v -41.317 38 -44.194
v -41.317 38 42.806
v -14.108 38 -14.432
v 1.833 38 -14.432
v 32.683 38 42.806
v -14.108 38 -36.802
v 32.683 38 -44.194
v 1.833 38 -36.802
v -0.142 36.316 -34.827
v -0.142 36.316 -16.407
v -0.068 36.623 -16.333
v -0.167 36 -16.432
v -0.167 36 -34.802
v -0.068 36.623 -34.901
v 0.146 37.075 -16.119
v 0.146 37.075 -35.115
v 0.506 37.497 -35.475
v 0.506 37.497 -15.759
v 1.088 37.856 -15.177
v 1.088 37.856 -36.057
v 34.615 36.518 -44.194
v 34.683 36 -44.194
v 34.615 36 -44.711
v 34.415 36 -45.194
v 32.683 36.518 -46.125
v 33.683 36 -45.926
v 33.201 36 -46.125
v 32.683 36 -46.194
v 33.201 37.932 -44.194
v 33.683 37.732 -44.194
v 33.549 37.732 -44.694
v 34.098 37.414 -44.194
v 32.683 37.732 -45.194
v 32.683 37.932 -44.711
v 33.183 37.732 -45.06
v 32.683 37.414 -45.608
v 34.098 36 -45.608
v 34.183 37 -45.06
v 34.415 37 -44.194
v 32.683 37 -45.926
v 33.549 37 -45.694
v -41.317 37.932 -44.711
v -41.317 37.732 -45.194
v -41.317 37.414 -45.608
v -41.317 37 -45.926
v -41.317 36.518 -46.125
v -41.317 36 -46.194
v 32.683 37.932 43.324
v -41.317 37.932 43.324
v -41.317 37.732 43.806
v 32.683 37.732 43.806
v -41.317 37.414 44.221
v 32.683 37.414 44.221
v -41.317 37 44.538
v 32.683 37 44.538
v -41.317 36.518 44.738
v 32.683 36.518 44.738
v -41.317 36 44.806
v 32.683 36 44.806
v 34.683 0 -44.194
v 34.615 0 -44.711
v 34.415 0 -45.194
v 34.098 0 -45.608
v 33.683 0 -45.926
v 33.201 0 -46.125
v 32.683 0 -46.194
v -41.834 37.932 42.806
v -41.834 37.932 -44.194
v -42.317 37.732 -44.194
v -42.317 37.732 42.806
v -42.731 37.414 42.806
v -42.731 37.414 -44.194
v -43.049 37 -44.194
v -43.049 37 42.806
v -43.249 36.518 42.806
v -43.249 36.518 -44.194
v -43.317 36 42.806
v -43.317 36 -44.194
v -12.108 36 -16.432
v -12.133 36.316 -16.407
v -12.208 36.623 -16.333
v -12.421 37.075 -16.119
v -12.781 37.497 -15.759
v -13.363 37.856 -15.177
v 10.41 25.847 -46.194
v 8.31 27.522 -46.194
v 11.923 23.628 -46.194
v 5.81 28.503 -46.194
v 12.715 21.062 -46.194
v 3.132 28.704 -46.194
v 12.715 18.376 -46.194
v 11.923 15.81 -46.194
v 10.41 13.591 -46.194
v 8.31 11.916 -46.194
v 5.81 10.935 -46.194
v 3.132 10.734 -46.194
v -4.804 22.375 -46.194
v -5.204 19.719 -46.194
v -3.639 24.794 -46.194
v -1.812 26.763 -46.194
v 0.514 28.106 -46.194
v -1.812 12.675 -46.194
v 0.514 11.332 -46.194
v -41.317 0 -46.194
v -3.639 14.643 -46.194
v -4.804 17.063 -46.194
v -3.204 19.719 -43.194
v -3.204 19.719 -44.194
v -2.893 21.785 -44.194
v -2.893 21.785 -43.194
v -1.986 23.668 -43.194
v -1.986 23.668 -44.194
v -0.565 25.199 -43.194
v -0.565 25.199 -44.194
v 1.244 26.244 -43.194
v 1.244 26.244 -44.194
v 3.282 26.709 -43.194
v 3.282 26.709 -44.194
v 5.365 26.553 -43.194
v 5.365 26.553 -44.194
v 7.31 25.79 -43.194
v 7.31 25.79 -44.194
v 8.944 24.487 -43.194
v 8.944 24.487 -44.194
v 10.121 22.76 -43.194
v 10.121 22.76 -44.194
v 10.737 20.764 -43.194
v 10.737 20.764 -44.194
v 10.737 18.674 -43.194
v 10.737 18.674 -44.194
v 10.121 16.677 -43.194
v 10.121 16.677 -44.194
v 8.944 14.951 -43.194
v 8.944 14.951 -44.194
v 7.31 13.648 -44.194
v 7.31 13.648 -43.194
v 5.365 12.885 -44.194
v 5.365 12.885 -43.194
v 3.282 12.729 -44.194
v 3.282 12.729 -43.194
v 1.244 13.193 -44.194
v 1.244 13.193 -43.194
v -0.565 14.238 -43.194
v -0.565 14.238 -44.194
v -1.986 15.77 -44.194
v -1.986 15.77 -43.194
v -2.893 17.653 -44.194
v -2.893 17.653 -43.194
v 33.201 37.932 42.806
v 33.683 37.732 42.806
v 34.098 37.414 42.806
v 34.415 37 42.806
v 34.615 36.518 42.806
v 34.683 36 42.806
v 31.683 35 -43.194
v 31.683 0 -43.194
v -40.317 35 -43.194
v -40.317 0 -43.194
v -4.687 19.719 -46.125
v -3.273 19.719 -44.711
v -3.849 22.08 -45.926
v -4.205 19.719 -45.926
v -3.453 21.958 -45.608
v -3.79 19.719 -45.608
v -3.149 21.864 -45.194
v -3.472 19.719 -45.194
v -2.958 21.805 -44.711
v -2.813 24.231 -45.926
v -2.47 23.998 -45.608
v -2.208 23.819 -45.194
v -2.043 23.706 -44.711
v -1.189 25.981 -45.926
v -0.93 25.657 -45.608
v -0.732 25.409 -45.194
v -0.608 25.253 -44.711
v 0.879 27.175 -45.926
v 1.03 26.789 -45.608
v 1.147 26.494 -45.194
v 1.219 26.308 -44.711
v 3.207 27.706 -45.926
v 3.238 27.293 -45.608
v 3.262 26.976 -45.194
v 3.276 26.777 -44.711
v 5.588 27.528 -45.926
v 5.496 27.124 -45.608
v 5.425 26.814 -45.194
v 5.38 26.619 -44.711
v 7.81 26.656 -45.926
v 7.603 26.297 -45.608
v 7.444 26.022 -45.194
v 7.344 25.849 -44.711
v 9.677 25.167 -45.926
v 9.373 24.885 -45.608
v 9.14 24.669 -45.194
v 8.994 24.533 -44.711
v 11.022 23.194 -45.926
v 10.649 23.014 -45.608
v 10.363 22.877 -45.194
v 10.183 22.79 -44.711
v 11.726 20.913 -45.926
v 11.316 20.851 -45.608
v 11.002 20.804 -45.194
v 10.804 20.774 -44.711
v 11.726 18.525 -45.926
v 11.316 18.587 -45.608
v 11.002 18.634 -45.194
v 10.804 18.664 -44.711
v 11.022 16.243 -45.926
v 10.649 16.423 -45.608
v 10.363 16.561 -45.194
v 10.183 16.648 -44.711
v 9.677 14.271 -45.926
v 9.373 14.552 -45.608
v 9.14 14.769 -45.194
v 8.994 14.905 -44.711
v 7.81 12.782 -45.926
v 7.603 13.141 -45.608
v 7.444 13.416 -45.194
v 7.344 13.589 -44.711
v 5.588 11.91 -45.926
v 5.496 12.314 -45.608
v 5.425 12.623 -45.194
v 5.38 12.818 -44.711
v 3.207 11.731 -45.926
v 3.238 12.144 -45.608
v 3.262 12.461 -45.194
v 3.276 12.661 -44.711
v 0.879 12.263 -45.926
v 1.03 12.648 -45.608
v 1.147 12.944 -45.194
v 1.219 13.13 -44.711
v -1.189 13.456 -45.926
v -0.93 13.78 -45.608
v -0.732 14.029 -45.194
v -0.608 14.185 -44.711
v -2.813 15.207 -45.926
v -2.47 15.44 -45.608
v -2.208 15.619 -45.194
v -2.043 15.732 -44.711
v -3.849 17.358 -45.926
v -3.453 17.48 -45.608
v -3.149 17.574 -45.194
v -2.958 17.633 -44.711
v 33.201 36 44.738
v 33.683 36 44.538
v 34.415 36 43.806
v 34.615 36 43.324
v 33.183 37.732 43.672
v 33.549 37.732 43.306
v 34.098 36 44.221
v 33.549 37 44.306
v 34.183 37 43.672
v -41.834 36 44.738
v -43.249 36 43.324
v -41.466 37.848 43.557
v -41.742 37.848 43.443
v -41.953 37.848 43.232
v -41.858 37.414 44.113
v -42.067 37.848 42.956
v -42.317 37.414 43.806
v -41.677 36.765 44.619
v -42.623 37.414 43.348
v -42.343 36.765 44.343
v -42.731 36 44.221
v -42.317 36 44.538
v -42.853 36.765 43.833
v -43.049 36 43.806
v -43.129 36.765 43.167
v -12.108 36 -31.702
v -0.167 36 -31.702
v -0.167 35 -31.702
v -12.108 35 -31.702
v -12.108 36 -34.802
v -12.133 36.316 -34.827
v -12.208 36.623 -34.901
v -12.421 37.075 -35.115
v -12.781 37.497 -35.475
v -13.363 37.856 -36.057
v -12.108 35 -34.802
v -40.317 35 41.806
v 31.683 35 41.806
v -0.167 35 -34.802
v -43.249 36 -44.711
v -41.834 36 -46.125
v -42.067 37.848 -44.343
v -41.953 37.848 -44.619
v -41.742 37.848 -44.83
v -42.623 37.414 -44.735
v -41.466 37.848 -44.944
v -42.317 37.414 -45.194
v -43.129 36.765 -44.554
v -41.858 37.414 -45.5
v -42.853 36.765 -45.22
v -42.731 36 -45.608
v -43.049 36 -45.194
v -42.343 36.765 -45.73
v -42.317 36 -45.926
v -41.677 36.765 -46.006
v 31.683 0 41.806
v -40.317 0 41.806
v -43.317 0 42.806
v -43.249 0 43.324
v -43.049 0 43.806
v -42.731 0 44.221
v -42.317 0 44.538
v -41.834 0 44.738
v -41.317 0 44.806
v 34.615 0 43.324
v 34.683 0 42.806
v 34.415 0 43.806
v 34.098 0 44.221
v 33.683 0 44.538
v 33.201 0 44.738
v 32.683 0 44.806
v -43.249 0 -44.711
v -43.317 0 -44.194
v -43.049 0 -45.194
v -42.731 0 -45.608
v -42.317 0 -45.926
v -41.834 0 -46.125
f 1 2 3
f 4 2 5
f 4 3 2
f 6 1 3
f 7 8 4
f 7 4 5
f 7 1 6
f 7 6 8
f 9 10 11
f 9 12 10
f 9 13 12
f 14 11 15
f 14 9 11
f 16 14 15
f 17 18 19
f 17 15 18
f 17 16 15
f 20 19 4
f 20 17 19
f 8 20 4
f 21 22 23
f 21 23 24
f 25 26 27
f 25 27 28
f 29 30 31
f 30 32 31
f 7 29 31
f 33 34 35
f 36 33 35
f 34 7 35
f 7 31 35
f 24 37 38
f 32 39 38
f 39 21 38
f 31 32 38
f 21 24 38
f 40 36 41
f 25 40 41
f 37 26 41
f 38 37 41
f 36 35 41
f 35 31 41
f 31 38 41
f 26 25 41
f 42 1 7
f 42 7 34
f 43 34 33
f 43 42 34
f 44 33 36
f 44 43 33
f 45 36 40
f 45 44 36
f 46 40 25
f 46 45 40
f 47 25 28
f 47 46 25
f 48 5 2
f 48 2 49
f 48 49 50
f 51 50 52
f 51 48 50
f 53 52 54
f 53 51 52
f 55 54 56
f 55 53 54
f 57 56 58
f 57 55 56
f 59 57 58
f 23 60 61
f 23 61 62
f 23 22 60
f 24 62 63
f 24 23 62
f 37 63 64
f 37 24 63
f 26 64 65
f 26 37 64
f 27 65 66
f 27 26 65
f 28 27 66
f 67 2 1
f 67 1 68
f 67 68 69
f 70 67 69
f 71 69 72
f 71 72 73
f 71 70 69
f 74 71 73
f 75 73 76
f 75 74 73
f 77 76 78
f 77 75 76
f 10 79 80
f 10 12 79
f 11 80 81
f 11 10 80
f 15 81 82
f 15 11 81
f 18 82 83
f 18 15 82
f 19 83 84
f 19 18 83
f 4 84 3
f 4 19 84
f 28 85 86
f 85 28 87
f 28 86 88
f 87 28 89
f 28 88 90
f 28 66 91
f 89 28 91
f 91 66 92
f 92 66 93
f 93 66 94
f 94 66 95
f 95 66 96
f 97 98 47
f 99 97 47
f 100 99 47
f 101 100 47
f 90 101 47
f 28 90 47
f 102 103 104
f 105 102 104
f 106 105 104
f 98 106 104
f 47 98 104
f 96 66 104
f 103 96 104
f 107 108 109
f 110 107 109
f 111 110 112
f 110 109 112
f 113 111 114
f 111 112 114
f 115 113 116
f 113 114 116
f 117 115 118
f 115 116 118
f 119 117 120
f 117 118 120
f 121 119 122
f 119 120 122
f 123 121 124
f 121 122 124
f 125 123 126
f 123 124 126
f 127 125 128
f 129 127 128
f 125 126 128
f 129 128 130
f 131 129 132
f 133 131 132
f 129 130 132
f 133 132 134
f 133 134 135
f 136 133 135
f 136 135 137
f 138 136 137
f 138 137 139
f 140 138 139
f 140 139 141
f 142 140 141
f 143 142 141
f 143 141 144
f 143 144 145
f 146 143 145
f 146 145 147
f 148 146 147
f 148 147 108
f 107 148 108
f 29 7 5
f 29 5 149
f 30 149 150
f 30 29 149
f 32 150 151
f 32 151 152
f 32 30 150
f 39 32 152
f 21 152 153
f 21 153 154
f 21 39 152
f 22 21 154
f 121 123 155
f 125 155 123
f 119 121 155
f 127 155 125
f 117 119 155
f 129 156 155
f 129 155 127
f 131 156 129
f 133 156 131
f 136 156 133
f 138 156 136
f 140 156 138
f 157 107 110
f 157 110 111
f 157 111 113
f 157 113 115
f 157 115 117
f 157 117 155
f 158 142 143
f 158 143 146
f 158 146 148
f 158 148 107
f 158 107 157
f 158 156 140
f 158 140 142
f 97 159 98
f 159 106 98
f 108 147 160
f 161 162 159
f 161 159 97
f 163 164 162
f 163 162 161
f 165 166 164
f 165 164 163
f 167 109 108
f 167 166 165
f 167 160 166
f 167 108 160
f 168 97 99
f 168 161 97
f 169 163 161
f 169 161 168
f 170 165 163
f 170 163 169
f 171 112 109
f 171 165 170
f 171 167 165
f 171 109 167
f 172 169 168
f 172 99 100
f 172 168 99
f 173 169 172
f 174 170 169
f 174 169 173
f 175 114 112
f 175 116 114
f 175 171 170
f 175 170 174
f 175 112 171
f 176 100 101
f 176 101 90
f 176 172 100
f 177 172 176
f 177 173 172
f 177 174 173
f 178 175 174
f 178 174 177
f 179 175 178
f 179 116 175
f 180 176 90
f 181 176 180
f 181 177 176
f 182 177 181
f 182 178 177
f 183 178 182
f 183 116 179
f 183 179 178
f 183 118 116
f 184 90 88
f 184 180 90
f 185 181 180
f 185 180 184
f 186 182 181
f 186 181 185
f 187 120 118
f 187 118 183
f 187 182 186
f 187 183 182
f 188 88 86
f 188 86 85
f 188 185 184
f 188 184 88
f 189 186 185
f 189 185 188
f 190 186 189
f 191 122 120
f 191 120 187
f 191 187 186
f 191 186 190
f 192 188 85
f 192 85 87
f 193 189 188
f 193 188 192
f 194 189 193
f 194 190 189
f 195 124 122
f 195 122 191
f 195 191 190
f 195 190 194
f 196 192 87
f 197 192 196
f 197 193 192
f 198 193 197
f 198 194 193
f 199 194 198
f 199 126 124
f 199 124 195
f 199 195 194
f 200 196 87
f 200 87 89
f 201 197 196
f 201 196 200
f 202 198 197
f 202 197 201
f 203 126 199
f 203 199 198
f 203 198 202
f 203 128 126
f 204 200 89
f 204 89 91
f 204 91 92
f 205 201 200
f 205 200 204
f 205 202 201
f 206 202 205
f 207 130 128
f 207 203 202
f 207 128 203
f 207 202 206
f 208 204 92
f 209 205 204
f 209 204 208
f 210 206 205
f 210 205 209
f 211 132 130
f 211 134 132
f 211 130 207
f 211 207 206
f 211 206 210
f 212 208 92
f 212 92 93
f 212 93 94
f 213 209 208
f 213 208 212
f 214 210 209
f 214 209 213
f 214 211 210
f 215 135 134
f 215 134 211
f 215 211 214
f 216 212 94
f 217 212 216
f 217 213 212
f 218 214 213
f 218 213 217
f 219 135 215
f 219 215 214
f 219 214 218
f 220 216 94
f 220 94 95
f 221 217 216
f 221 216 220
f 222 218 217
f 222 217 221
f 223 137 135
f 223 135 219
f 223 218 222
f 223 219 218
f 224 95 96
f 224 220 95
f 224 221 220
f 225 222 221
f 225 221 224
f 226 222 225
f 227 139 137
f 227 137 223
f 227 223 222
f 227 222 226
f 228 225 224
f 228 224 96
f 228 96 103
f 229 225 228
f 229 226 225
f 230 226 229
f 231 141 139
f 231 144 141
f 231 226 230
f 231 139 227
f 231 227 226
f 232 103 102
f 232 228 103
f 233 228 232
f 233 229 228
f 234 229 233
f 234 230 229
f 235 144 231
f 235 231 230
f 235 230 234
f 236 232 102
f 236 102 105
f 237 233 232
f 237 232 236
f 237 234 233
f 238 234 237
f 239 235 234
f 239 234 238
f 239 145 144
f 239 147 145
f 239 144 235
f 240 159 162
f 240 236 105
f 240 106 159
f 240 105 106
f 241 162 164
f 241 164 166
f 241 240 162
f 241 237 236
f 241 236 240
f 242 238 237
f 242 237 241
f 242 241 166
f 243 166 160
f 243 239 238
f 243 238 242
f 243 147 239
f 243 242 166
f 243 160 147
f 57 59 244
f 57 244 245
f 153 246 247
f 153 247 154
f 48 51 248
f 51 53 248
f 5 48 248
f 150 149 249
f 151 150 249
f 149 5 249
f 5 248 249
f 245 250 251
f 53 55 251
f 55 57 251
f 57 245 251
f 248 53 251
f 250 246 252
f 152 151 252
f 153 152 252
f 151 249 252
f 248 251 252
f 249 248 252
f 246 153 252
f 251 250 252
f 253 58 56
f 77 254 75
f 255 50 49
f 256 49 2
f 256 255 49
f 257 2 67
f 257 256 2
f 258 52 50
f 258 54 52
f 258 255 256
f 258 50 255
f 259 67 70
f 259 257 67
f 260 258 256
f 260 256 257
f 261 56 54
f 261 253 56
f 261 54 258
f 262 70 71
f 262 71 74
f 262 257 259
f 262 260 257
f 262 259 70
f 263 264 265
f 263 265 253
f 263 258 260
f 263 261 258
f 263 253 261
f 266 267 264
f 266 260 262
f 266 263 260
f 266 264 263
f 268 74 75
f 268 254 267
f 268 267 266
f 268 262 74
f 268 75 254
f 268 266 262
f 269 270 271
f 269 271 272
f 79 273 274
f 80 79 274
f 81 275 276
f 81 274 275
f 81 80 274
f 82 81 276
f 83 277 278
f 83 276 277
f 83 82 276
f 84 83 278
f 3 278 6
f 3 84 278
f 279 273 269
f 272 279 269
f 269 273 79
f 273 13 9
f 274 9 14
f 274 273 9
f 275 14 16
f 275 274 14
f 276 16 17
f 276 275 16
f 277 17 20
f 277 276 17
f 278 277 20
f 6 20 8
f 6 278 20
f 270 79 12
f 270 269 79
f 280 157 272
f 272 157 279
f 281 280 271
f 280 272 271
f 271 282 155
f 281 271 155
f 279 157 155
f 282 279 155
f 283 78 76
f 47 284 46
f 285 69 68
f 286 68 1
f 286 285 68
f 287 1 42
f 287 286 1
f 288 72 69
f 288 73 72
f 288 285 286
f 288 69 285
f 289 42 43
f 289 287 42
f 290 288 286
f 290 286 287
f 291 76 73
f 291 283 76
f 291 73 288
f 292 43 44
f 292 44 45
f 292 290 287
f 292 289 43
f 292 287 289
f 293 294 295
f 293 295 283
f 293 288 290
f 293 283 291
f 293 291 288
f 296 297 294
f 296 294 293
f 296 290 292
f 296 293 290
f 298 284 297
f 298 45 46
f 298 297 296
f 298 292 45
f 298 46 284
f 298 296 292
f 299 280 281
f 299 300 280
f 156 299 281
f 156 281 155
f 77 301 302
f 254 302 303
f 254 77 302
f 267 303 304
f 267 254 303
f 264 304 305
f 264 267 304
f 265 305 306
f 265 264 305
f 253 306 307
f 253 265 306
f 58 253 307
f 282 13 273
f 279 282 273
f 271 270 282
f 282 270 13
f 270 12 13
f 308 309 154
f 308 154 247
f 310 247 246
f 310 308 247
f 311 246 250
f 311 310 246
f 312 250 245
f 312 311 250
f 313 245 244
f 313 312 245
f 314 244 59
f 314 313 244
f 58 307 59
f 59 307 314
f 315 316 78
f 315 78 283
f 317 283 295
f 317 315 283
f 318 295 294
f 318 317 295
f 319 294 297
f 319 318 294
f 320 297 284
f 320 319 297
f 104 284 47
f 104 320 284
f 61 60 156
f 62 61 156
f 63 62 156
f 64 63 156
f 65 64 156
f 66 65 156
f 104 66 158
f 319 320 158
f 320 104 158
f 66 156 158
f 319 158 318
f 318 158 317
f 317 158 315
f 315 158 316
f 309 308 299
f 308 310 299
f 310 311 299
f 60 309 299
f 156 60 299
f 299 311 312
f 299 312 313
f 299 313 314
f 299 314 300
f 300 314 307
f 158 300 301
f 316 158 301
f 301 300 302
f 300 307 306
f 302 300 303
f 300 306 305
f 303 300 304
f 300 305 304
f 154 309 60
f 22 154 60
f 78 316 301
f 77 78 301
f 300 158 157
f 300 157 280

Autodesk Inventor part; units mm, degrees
ref_plane "YZ Plane" through (0, 0, 0) normal (1, 0, 0) x (0, 1, 0)
ref_plane "XZ Plane" through (0, 0, 0) normal (0, 1, 0) x (-1, 0, 0)
ref_plane "XY Plane" through (0, 0, 0) normal (0, 0, 1) x (1, 0, 0)
sketch "Sketch1" plane through (0, 0, 0) normal (0, 1, 0) x (-1, 0, 0)
  line L0 (40.3167, 41.8064) -> (-31.6833, 41.8064)
  line L1 (-31.6833, 41.8064) -> (-31.6833, -43.1936)
  line L2 (-31.6833, -43.1936) -> (40.3167, -43.1936)
  line L3 (40.3167, -43.1936) -> (40.3167, 41.8064)
  line L4 (43.3167, 44.8064) -> (-34.6833, 44.8064)
  line L5 (-34.6833, 44.8064) -> (-34.6833, -46.1936)
  line L6 (-34.6833, -46.1936) -> (43.3167, -46.1936)
  line L7 (43.3167, -46.1936) -> (43.3167, 44.8064)
  point P0 (0, 0)
  dimension "d0" = 85
  dimension "d1" = 72
  dimension "d2" = 3
  dimension "d3" = 3
  dimension "d4" = 3
  dimension "d5" = 3
extrude "Extrusion1" add sketch "Sketch1" along normal blind 35
sketch "Sketch2" plane through (0, 35, 0) normal (0, 1, 0) x (1, 0, 0)
  line L0 (34.6833, -44.8064) -> (34.6833, 46.1936) projected
  line L1 (-43.3167, -44.8064) -> (34.6833, -44.8064)
  line L2 (34.6833, -44.8064) -> (34.6833, 46.1936)
  line L3 (34.6833, 46.1936) -> (-43.3167, 46.1936)
  line L4 (-43.3167, 46.1936) -> (-43.3167, -44.8064)
  point P0 (0, 0)
  point P1 (34.6833, -44.8064)
extrude "Extrusion2" add sketch "Sketch2" along normal blind 3
sketch "Sketch3" plane through (34.6833, 0, 44.8064) normal (1, 0, 0) x (0, 0, -1)
  point P0 (44.8064, 0)
sketch "Sketch4" plane through (34.6833, 0, -46.1936) normal (0, 0, -1) x (-1, 0, 0)
  circle A0 centre (30.8779, 19.7188) radius 7.0099
  point P0 (34.6833, 0)
extrude "Extrusion3" cut sketch "Sketch4" against normal blind 35
sketch "Sketch5" plane through (0, 38, 0) normal (0, 1, 0) x (1, 0, 0)
  line L0 (-12.108, 16.4323) -> (-0.1673, 16.4323)
  line L1 (-0.1673, 16.4323) -> (-0.1673, 34.8019)
  line L2 (-0.1673, 34.8019) -> (-12.108, 34.8019)
  line L3 (-12.108, 34.8019) -> (-12.108, 16.4323)
  point P0 (0, 0)
extrude "Extrusion4" cut sketch "Sketch5" against normal blind 2
sketch "Sketch6" plane through (0, 36, 0) normal (0, 1, 0) x (1, 0, 0)
  point P0 (0, 0)
sketch "Sketch7" plane through (0, 36, 0) normal (0, 1, 0) x (1, 0, 0)
  line L0 (-12.108, 34.8019) -> (-0.1673, 34.8019) projected
  line L1 (-0.1673, 34.8019) -> (-0.1673, 16.4323) projected
  line L2 (-12.108, 34.8019) -> (-0.1673, 34.8019)
  line L3 (-0.1673, 34.8019) -> (-0.1673, 31.7024)
  line L4 (-0.1673, 31.7024) -> (-12.108, 31.7024)
  line L5 (-12.108, 31.7024) -> (-12.108, 34.8019)
  point P0 (0, 0)
extrude "Extrusion5" cut sketch "Sketch7" against normal blind 5
fillet "Fillet1" radius 2 10 edges at (-43.3167, 19, 44.8064) (-43.3167, 19, -46.1936) (-4.3167, 38, -46.1936) (-43.3167, 38, -0.6936) (34.6833, 38, -0.6936) (-6.1377, 38, -16.4323) (-0.1673, 38, -25.6171) (-12.108, 38, -25.6171) (-6.1377, 38, -34.8019) (-4.3167, 38, 44.8064)
fillet "Fillet2" radius 2 4 edges at (34.0975, 37.4142, 44.2206) (34.6833, 18.0001, 44.8064) (34.0975, 37.4142, -45.6079) (34.6833, 18.0001, -46.1936)
fillet "Fillet3" radius 2 1 edges at (10.8153, 19.7188, -46.1936)
properties part number "198MainChassis"
